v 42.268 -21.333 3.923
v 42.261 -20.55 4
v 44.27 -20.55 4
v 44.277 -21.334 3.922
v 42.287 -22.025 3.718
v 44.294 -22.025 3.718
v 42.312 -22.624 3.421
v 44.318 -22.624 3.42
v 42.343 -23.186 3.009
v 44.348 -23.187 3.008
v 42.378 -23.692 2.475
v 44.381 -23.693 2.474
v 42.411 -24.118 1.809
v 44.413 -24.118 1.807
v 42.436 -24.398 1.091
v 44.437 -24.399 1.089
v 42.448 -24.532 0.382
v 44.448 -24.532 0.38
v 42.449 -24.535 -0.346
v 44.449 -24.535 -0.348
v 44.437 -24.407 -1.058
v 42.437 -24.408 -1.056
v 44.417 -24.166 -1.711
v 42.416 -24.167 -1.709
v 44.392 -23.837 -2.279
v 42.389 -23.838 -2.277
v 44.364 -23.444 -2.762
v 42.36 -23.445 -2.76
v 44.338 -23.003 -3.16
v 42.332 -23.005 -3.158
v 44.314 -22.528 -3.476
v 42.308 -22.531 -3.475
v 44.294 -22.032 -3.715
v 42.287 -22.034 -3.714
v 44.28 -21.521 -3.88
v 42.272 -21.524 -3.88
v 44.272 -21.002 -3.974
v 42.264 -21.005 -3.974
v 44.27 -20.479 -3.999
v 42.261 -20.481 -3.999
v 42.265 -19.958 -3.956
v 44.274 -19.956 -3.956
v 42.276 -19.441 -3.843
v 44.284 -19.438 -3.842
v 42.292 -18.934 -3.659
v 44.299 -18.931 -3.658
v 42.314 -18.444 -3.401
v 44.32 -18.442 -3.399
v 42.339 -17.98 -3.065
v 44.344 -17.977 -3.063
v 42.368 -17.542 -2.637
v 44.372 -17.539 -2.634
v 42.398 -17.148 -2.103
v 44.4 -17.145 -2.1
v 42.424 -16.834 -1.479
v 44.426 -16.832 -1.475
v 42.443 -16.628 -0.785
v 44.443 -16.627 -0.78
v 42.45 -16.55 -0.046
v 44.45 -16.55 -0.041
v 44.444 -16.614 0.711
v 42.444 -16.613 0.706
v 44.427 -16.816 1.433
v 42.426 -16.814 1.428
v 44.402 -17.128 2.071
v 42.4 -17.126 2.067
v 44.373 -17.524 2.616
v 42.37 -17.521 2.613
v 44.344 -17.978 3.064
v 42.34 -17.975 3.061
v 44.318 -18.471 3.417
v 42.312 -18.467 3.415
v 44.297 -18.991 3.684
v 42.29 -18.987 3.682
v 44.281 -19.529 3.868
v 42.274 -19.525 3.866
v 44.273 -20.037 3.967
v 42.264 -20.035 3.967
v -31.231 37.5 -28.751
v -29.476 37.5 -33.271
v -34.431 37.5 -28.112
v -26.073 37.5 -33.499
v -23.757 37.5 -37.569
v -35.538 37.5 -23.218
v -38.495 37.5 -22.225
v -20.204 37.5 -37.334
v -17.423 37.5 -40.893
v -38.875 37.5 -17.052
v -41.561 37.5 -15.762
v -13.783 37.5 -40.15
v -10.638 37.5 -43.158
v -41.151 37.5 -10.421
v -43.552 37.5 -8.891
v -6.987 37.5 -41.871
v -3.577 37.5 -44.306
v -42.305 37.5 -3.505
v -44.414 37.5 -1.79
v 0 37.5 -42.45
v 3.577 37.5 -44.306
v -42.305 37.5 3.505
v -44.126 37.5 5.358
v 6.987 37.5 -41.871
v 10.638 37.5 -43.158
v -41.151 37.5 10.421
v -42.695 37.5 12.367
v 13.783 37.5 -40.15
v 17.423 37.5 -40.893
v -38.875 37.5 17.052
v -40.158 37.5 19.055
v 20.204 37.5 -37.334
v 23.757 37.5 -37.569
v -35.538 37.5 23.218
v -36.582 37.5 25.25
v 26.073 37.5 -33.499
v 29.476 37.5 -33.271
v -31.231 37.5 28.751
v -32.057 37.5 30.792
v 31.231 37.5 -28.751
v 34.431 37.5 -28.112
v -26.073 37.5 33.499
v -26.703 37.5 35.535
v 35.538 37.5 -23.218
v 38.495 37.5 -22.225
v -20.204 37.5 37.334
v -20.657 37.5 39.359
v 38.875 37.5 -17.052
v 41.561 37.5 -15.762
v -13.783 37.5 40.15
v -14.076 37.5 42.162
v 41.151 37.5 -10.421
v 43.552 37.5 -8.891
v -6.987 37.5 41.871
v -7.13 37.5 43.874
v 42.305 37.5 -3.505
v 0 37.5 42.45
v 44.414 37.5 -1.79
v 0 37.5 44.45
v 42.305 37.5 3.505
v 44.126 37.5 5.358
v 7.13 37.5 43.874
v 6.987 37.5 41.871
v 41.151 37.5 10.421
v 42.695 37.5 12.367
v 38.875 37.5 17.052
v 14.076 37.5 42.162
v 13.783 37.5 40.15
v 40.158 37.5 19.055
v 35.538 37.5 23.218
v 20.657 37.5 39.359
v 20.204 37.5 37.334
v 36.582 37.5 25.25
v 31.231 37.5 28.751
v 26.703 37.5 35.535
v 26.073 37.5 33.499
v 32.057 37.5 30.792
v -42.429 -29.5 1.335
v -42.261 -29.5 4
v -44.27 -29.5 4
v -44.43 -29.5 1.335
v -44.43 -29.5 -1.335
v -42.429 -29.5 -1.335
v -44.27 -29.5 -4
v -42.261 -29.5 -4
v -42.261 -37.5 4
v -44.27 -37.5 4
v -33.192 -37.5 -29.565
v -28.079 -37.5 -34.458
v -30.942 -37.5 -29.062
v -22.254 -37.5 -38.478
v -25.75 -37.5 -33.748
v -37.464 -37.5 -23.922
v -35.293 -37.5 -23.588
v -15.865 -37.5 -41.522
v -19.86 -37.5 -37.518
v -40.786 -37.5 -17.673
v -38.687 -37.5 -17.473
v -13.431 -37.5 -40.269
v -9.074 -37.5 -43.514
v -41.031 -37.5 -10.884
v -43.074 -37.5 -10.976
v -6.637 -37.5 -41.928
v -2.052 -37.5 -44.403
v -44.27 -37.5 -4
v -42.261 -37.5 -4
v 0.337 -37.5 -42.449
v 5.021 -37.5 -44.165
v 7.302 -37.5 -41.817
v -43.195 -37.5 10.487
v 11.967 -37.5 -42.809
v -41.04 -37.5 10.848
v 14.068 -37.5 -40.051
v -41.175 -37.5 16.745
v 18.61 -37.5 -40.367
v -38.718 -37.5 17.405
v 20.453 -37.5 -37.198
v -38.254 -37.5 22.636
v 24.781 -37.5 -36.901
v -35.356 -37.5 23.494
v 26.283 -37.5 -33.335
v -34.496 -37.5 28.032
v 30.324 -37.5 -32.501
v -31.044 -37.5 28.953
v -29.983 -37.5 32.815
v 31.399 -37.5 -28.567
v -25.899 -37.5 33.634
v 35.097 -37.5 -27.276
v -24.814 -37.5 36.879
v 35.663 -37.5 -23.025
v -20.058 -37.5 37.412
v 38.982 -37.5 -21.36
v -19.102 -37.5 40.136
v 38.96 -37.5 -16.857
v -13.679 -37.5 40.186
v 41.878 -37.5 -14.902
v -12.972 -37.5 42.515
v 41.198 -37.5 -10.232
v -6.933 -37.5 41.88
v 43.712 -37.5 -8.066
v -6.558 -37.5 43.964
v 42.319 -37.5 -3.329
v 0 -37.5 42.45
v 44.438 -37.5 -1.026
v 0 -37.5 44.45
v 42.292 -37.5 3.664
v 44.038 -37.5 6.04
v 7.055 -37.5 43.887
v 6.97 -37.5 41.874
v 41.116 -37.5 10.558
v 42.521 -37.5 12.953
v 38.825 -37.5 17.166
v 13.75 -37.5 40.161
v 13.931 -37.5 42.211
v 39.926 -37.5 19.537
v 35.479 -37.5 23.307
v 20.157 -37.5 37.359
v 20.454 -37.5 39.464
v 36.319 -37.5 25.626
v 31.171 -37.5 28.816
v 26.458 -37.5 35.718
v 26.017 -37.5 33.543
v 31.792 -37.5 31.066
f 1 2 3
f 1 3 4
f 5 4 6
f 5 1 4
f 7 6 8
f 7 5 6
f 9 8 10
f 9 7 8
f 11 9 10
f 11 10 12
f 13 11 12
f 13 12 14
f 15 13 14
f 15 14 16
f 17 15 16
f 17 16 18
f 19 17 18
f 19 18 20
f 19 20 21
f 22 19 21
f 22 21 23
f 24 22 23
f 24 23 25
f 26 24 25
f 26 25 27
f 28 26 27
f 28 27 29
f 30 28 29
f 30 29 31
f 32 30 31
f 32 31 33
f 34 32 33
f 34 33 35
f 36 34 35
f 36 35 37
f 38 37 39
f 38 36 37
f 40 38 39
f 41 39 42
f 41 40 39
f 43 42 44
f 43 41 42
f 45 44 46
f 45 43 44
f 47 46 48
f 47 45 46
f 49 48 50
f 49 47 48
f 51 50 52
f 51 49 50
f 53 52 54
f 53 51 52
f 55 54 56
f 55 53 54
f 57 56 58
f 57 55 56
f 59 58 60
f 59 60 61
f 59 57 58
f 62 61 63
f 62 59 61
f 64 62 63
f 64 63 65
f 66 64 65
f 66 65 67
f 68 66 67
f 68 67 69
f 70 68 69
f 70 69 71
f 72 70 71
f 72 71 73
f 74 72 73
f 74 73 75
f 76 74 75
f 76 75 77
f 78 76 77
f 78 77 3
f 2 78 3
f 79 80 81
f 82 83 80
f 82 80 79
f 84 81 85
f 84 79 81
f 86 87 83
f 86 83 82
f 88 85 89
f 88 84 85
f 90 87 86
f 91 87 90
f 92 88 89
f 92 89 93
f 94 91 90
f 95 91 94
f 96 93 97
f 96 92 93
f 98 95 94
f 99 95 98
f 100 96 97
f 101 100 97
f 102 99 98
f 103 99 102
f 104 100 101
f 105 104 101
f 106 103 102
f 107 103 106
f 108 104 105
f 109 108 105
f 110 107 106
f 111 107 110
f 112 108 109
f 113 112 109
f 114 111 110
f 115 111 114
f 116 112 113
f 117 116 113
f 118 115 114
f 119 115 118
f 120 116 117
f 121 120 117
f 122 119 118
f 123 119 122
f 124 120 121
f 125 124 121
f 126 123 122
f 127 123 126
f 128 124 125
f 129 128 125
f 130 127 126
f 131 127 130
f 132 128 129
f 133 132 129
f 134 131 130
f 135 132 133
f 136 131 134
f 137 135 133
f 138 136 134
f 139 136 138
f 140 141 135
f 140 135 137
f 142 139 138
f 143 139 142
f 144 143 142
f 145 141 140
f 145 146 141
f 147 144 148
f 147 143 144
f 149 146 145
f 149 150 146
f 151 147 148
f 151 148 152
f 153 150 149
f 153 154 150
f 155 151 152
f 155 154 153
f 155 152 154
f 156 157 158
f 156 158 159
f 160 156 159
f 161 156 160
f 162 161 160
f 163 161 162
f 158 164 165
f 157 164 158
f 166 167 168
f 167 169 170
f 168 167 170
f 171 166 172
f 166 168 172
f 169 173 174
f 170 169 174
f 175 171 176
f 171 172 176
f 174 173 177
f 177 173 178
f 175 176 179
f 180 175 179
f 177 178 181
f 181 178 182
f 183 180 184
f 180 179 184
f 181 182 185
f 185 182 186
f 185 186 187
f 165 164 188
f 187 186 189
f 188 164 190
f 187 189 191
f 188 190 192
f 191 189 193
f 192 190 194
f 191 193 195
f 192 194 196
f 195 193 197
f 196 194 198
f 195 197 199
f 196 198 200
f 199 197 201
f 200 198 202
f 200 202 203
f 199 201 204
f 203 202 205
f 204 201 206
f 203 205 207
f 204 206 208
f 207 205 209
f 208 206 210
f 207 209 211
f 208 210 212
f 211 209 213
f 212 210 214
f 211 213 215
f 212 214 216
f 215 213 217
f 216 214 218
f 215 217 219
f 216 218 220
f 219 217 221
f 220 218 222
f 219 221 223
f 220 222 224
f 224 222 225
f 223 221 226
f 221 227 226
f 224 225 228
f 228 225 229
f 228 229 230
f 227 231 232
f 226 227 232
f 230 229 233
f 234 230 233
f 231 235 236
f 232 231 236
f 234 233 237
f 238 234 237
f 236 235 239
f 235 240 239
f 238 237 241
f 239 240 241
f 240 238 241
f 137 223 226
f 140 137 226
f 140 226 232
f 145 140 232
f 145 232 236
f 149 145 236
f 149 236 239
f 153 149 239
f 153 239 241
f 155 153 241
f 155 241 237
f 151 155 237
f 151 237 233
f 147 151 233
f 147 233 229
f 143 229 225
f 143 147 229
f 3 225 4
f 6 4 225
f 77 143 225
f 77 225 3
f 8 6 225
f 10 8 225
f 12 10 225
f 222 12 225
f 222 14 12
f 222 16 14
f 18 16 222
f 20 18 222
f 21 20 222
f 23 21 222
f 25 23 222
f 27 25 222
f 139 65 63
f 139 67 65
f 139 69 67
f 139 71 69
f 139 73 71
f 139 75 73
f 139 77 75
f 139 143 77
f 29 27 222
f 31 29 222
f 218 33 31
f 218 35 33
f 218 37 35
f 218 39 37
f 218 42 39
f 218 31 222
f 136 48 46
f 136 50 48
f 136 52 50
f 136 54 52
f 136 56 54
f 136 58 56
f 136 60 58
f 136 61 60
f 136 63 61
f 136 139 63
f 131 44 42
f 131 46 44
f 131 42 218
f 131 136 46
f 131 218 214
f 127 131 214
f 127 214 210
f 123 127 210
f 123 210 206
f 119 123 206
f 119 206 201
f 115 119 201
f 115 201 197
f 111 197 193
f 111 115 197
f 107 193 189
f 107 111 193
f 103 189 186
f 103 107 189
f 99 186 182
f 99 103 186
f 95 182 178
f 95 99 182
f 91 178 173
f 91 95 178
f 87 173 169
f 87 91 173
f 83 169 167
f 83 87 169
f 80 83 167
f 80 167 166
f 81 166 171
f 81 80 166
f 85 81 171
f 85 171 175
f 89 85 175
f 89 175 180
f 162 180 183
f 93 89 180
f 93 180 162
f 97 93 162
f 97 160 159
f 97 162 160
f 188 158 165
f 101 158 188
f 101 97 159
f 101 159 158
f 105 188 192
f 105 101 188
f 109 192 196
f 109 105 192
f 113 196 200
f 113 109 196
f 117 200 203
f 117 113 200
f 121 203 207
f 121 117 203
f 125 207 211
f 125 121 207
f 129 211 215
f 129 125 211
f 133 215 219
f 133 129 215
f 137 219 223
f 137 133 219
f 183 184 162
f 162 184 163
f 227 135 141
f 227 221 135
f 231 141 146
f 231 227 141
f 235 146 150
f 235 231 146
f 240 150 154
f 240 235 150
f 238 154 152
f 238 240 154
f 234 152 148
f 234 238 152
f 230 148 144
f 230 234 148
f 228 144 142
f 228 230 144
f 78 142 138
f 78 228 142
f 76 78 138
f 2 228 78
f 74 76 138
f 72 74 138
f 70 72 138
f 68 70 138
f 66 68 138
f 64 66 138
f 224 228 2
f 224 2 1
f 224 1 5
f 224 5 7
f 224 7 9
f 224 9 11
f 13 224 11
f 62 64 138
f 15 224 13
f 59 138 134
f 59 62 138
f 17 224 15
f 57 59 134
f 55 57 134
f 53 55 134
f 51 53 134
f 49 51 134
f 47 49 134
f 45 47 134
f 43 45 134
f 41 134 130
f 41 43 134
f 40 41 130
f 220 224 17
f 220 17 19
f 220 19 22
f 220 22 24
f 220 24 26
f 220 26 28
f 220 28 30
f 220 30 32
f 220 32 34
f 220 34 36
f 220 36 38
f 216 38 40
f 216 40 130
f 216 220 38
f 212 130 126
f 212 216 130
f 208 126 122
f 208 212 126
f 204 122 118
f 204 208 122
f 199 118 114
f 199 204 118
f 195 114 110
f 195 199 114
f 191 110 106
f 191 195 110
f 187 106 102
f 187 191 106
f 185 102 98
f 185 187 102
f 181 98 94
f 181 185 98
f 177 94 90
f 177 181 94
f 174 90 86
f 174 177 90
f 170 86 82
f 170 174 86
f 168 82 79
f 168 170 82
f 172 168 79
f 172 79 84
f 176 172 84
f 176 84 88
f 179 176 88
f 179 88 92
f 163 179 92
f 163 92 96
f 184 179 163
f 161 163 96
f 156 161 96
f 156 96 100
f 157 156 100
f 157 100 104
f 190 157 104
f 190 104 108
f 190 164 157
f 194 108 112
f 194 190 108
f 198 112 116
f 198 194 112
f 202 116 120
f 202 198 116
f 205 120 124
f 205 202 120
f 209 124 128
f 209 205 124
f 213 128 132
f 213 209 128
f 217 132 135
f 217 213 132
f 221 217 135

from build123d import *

# Parameters (mm, degrees)
SKETCH1_R               = 44.45
SKETCH1_R_2             = 42.45
BOSS_EXTRUDE1_DEPTH     = 37.5
CUT_EXTRUDE1_REACH      = 75.197
CUT_EXTRUDE1_END_RADIUS = 44.45
SKETCH2_W               = 8
SKETCH2_H               = 16
SKETCH3_R               = 4
CUT_EXTRUDE2_DEPTH      = 74.197370171


with BuildPart() as part:
    # Sketch1 → Boss-Extrude1 (new, symmetric)
    with BuildSketch(Plane(origin=(0, 0, 0), x_dir=(1, 0, 0), z_dir=(0, 1, 0))):
        with Locations(Location((0, 0, 0), (0, 0, 270))):
            Circle(SKETCH1_R)
        with Locations(Location((0, 0, 0), (0, 0, 270))):
            Circle(SKETCH1_R_2, mode=Mode.SUBTRACT)
    extrude(amount=BOSS_EXTRUDE1_DEPTH, both=True)

    # Cut-Extrude1: up to this cylinder (the profile starts inside it)
    cut_extrude1_end = Plane(origin=(0, -37.5, 0), z_dir=(0, -1, 0)) * Cylinder(CUT_EXTRUDE1_END_RADIUS, 240.294, mode=Mode.PRIVATE)
    # Sketch2 → Cut-Extrude1 (cut, up to the surface)
    with BuildSketch(Plane(origin=(0, 0, 0), x_dir=(0, 0, -1), z_dir=(1, 0, 0)), mode=Mode.PRIVATE) as cut_extrude1_sk1:
        with Locations((0, -37.5)):
            Rectangle(SKETCH2_W, SKETCH2_H)
    cut_extrude1_tool1 = extrude(cut_extrude1_sk1.sketch, amount=-CUT_EXTRUDE1_REACH, mode=Mode.PRIVATE) & cut_extrude1_end
    add(cut_extrude1_tool1.solids().sort_by_distance((0, -37.5, 0))[0], mode=Mode.SUBTRACT)

    # Sketch3 → Cut-Extrude2 (cut, through all)
    with BuildSketch(Plane(origin=(0, 0, 0), x_dir=(0, 0, -1), z_dir=(1, 0, 0))):
        with Locations(Location((0, -20.55, 0), (0, 0, 180))):
            Circle(SKETCH3_R)
    extrude(amount=CUT_EXTRUDE2_DEPTH, mode=Mode.SUBTRACT)


solid = part.part
